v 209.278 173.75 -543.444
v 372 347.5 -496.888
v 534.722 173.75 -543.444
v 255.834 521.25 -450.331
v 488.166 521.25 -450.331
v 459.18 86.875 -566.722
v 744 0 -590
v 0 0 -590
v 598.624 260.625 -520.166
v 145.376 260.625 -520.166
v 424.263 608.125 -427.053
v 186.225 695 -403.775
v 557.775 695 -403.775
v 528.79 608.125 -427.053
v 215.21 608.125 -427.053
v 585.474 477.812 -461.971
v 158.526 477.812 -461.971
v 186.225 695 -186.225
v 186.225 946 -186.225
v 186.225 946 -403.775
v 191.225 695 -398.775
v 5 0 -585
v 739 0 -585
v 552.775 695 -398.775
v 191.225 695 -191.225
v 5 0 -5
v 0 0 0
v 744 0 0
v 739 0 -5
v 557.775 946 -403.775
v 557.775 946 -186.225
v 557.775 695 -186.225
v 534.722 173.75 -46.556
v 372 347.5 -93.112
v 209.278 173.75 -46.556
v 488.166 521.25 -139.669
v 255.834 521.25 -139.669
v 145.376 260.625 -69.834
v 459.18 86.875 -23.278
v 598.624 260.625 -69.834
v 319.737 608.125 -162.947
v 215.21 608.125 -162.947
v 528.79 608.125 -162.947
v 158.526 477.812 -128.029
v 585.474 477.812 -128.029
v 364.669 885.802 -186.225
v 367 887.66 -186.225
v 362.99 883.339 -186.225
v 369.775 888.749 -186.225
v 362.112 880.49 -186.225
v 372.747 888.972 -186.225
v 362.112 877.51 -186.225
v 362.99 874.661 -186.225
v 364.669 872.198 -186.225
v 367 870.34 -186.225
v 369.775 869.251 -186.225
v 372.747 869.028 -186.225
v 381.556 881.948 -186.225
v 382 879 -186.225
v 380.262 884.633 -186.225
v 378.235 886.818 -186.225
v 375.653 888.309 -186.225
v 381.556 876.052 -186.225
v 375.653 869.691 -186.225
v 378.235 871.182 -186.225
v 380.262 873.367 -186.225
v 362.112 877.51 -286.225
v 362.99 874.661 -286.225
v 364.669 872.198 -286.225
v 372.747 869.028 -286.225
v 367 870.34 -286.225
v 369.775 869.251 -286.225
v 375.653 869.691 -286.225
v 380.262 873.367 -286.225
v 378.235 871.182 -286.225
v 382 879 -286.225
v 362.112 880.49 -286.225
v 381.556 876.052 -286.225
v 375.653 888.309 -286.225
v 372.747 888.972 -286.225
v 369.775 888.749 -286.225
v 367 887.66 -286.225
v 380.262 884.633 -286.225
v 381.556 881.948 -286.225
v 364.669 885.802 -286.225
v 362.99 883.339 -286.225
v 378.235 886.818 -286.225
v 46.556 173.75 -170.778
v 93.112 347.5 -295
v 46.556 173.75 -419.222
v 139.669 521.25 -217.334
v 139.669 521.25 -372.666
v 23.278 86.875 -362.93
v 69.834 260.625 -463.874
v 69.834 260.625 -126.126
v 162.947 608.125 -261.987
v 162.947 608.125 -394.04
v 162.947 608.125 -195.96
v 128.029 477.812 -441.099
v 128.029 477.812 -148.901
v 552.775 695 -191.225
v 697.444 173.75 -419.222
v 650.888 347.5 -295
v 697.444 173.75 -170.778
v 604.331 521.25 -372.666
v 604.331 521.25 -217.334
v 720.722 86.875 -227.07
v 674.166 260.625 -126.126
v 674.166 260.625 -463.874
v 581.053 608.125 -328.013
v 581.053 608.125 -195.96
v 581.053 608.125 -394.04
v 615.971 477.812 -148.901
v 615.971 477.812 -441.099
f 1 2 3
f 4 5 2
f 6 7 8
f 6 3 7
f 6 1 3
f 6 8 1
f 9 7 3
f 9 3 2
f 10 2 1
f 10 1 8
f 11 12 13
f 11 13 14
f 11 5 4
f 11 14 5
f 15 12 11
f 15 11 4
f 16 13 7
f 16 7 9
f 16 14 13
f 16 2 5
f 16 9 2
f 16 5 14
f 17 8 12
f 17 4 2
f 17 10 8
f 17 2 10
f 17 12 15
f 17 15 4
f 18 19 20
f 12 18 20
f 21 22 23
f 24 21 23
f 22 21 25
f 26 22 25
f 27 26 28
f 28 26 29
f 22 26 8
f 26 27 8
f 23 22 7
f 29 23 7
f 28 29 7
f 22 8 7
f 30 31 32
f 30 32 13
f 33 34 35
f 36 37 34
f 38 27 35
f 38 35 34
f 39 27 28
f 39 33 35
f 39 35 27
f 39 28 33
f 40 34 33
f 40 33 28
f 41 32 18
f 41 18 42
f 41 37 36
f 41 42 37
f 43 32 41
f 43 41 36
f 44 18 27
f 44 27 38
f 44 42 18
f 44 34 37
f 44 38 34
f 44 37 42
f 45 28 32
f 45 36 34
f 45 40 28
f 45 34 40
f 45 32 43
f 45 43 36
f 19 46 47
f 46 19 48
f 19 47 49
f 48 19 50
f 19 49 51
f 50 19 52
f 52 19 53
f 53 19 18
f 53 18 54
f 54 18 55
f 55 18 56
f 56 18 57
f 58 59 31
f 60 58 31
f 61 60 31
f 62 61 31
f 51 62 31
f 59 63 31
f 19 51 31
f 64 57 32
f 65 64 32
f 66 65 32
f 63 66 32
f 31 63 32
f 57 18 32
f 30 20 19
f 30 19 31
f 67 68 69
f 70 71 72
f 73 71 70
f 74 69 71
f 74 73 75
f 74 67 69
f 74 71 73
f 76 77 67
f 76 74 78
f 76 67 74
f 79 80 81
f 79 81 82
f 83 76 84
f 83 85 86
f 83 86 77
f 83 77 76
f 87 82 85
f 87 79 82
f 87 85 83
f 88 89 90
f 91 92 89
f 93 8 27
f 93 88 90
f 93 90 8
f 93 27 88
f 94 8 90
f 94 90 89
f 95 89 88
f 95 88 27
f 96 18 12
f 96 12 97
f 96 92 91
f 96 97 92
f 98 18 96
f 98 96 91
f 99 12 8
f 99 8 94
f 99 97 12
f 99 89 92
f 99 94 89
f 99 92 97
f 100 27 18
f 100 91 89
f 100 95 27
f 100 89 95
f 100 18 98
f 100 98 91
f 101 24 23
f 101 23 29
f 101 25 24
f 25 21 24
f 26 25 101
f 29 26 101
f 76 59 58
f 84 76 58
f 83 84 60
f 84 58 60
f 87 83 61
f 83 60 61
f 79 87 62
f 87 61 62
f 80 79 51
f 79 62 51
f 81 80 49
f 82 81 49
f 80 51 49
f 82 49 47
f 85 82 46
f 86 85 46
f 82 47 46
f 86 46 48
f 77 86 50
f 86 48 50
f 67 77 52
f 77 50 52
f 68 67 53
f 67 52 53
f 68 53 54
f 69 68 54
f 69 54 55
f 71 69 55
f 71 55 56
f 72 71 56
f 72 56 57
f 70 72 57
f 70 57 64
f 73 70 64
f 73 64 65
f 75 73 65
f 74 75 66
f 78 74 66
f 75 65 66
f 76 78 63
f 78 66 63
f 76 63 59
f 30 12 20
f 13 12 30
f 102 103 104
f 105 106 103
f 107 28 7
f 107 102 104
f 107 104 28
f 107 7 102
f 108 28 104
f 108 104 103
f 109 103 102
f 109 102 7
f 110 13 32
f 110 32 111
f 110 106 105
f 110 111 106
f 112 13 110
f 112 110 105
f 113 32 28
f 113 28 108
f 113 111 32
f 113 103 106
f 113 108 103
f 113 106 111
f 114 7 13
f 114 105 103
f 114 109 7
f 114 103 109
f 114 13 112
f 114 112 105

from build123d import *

# Parameters (mm, degrees)
SKETCH1_W           = 744
SKETCH1_H           = 590
BOSS_EXTRUDE1_DEPTH = 695
BOSS_EXTRUDE1_TAPER = 15
SKETCH6_W           = 734
SKETCH6_H           = 580
CUT_EXTRUDE3_DEPTH  = 784
CUT_EXTRUDE3_DRAFT  = -15
SKETCH7_W           = 371.55062252
SKETCH7_H           = 217.55062252
BOSS_EXTRUDE2_DEPTH = 251
SKETCH8_R           = 10
CUT_EXTRUDE4_DEPTH  = 100


with BuildPart() as part:
    # Sketch1 → Boss-Extrude1 (new body)
    with BuildSketch(Plane(origin=(0, 0, 0), x_dir=(1, 0, 0), z_dir=(0, 1, 0))):
        with Locations((372, 295)):
            Rectangle(SKETCH1_W, SKETCH1_H)
    extrude(amount=BOSS_EXTRUDE1_DEPTH, taper=BOSS_EXTRUDE1_TAPER)


with BuildPart() as cut_extrude3_tool:
    # Sketch6 → Cut-Extrude3 (with draft: the straight prism first)
    with BuildSketch(Plane.XZ):
        with Locations((372, -295)):
            Rectangle(SKETCH6_W, SKETCH6_H)
    extrude(amount=-CUT_EXTRUDE3_DEPTH)
    # Cut-Extrude3: the draft: its side faces are tilted about the plane it starts from
    cut_extrude3_sides = [cut_extrude3_tool.faces().sort_by_distance(p)[0] for p in [
        (372, 392, -585),
        (739, 392, -295),
        (372, 392, -5),
        (5, 392, -295),
    ]]
    draft(cut_extrude3_sides, Plane.XZ, CUT_EXTRUDE3_DRAFT)


with BuildPart() as part_1:
    add(part.part)

    # Cut-Extrude3: cut by cut_extrude3_tool
    add(cut_extrude3_tool.part, mode=Mode.SUBTRACT)

    # Sketch7 → Boss-Extrude2 (add)
    with BuildSketch(Plane(origin=(0, 695, 0), x_dir=(1, 0, 0), z_dir=(0, 1, 0))):
        with Locations((372, 295)):
            Rectangle(SKETCH7_W, SKETCH7_H)
    extrude(amount=BOSS_EXTRUDE2_DEPTH)

    # Sketch8 → Cut-Extrude4 (cut)
    with BuildSketch(Plane.XY.offset(-186.22468874)):
        with Locations((372, 879)):
            Circle(SKETCH8_R)
    extrude(amount=-CUT_EXTRUDE4_DEPTH, mode=Mode.SUBTRACT)


solid = part_1.part
